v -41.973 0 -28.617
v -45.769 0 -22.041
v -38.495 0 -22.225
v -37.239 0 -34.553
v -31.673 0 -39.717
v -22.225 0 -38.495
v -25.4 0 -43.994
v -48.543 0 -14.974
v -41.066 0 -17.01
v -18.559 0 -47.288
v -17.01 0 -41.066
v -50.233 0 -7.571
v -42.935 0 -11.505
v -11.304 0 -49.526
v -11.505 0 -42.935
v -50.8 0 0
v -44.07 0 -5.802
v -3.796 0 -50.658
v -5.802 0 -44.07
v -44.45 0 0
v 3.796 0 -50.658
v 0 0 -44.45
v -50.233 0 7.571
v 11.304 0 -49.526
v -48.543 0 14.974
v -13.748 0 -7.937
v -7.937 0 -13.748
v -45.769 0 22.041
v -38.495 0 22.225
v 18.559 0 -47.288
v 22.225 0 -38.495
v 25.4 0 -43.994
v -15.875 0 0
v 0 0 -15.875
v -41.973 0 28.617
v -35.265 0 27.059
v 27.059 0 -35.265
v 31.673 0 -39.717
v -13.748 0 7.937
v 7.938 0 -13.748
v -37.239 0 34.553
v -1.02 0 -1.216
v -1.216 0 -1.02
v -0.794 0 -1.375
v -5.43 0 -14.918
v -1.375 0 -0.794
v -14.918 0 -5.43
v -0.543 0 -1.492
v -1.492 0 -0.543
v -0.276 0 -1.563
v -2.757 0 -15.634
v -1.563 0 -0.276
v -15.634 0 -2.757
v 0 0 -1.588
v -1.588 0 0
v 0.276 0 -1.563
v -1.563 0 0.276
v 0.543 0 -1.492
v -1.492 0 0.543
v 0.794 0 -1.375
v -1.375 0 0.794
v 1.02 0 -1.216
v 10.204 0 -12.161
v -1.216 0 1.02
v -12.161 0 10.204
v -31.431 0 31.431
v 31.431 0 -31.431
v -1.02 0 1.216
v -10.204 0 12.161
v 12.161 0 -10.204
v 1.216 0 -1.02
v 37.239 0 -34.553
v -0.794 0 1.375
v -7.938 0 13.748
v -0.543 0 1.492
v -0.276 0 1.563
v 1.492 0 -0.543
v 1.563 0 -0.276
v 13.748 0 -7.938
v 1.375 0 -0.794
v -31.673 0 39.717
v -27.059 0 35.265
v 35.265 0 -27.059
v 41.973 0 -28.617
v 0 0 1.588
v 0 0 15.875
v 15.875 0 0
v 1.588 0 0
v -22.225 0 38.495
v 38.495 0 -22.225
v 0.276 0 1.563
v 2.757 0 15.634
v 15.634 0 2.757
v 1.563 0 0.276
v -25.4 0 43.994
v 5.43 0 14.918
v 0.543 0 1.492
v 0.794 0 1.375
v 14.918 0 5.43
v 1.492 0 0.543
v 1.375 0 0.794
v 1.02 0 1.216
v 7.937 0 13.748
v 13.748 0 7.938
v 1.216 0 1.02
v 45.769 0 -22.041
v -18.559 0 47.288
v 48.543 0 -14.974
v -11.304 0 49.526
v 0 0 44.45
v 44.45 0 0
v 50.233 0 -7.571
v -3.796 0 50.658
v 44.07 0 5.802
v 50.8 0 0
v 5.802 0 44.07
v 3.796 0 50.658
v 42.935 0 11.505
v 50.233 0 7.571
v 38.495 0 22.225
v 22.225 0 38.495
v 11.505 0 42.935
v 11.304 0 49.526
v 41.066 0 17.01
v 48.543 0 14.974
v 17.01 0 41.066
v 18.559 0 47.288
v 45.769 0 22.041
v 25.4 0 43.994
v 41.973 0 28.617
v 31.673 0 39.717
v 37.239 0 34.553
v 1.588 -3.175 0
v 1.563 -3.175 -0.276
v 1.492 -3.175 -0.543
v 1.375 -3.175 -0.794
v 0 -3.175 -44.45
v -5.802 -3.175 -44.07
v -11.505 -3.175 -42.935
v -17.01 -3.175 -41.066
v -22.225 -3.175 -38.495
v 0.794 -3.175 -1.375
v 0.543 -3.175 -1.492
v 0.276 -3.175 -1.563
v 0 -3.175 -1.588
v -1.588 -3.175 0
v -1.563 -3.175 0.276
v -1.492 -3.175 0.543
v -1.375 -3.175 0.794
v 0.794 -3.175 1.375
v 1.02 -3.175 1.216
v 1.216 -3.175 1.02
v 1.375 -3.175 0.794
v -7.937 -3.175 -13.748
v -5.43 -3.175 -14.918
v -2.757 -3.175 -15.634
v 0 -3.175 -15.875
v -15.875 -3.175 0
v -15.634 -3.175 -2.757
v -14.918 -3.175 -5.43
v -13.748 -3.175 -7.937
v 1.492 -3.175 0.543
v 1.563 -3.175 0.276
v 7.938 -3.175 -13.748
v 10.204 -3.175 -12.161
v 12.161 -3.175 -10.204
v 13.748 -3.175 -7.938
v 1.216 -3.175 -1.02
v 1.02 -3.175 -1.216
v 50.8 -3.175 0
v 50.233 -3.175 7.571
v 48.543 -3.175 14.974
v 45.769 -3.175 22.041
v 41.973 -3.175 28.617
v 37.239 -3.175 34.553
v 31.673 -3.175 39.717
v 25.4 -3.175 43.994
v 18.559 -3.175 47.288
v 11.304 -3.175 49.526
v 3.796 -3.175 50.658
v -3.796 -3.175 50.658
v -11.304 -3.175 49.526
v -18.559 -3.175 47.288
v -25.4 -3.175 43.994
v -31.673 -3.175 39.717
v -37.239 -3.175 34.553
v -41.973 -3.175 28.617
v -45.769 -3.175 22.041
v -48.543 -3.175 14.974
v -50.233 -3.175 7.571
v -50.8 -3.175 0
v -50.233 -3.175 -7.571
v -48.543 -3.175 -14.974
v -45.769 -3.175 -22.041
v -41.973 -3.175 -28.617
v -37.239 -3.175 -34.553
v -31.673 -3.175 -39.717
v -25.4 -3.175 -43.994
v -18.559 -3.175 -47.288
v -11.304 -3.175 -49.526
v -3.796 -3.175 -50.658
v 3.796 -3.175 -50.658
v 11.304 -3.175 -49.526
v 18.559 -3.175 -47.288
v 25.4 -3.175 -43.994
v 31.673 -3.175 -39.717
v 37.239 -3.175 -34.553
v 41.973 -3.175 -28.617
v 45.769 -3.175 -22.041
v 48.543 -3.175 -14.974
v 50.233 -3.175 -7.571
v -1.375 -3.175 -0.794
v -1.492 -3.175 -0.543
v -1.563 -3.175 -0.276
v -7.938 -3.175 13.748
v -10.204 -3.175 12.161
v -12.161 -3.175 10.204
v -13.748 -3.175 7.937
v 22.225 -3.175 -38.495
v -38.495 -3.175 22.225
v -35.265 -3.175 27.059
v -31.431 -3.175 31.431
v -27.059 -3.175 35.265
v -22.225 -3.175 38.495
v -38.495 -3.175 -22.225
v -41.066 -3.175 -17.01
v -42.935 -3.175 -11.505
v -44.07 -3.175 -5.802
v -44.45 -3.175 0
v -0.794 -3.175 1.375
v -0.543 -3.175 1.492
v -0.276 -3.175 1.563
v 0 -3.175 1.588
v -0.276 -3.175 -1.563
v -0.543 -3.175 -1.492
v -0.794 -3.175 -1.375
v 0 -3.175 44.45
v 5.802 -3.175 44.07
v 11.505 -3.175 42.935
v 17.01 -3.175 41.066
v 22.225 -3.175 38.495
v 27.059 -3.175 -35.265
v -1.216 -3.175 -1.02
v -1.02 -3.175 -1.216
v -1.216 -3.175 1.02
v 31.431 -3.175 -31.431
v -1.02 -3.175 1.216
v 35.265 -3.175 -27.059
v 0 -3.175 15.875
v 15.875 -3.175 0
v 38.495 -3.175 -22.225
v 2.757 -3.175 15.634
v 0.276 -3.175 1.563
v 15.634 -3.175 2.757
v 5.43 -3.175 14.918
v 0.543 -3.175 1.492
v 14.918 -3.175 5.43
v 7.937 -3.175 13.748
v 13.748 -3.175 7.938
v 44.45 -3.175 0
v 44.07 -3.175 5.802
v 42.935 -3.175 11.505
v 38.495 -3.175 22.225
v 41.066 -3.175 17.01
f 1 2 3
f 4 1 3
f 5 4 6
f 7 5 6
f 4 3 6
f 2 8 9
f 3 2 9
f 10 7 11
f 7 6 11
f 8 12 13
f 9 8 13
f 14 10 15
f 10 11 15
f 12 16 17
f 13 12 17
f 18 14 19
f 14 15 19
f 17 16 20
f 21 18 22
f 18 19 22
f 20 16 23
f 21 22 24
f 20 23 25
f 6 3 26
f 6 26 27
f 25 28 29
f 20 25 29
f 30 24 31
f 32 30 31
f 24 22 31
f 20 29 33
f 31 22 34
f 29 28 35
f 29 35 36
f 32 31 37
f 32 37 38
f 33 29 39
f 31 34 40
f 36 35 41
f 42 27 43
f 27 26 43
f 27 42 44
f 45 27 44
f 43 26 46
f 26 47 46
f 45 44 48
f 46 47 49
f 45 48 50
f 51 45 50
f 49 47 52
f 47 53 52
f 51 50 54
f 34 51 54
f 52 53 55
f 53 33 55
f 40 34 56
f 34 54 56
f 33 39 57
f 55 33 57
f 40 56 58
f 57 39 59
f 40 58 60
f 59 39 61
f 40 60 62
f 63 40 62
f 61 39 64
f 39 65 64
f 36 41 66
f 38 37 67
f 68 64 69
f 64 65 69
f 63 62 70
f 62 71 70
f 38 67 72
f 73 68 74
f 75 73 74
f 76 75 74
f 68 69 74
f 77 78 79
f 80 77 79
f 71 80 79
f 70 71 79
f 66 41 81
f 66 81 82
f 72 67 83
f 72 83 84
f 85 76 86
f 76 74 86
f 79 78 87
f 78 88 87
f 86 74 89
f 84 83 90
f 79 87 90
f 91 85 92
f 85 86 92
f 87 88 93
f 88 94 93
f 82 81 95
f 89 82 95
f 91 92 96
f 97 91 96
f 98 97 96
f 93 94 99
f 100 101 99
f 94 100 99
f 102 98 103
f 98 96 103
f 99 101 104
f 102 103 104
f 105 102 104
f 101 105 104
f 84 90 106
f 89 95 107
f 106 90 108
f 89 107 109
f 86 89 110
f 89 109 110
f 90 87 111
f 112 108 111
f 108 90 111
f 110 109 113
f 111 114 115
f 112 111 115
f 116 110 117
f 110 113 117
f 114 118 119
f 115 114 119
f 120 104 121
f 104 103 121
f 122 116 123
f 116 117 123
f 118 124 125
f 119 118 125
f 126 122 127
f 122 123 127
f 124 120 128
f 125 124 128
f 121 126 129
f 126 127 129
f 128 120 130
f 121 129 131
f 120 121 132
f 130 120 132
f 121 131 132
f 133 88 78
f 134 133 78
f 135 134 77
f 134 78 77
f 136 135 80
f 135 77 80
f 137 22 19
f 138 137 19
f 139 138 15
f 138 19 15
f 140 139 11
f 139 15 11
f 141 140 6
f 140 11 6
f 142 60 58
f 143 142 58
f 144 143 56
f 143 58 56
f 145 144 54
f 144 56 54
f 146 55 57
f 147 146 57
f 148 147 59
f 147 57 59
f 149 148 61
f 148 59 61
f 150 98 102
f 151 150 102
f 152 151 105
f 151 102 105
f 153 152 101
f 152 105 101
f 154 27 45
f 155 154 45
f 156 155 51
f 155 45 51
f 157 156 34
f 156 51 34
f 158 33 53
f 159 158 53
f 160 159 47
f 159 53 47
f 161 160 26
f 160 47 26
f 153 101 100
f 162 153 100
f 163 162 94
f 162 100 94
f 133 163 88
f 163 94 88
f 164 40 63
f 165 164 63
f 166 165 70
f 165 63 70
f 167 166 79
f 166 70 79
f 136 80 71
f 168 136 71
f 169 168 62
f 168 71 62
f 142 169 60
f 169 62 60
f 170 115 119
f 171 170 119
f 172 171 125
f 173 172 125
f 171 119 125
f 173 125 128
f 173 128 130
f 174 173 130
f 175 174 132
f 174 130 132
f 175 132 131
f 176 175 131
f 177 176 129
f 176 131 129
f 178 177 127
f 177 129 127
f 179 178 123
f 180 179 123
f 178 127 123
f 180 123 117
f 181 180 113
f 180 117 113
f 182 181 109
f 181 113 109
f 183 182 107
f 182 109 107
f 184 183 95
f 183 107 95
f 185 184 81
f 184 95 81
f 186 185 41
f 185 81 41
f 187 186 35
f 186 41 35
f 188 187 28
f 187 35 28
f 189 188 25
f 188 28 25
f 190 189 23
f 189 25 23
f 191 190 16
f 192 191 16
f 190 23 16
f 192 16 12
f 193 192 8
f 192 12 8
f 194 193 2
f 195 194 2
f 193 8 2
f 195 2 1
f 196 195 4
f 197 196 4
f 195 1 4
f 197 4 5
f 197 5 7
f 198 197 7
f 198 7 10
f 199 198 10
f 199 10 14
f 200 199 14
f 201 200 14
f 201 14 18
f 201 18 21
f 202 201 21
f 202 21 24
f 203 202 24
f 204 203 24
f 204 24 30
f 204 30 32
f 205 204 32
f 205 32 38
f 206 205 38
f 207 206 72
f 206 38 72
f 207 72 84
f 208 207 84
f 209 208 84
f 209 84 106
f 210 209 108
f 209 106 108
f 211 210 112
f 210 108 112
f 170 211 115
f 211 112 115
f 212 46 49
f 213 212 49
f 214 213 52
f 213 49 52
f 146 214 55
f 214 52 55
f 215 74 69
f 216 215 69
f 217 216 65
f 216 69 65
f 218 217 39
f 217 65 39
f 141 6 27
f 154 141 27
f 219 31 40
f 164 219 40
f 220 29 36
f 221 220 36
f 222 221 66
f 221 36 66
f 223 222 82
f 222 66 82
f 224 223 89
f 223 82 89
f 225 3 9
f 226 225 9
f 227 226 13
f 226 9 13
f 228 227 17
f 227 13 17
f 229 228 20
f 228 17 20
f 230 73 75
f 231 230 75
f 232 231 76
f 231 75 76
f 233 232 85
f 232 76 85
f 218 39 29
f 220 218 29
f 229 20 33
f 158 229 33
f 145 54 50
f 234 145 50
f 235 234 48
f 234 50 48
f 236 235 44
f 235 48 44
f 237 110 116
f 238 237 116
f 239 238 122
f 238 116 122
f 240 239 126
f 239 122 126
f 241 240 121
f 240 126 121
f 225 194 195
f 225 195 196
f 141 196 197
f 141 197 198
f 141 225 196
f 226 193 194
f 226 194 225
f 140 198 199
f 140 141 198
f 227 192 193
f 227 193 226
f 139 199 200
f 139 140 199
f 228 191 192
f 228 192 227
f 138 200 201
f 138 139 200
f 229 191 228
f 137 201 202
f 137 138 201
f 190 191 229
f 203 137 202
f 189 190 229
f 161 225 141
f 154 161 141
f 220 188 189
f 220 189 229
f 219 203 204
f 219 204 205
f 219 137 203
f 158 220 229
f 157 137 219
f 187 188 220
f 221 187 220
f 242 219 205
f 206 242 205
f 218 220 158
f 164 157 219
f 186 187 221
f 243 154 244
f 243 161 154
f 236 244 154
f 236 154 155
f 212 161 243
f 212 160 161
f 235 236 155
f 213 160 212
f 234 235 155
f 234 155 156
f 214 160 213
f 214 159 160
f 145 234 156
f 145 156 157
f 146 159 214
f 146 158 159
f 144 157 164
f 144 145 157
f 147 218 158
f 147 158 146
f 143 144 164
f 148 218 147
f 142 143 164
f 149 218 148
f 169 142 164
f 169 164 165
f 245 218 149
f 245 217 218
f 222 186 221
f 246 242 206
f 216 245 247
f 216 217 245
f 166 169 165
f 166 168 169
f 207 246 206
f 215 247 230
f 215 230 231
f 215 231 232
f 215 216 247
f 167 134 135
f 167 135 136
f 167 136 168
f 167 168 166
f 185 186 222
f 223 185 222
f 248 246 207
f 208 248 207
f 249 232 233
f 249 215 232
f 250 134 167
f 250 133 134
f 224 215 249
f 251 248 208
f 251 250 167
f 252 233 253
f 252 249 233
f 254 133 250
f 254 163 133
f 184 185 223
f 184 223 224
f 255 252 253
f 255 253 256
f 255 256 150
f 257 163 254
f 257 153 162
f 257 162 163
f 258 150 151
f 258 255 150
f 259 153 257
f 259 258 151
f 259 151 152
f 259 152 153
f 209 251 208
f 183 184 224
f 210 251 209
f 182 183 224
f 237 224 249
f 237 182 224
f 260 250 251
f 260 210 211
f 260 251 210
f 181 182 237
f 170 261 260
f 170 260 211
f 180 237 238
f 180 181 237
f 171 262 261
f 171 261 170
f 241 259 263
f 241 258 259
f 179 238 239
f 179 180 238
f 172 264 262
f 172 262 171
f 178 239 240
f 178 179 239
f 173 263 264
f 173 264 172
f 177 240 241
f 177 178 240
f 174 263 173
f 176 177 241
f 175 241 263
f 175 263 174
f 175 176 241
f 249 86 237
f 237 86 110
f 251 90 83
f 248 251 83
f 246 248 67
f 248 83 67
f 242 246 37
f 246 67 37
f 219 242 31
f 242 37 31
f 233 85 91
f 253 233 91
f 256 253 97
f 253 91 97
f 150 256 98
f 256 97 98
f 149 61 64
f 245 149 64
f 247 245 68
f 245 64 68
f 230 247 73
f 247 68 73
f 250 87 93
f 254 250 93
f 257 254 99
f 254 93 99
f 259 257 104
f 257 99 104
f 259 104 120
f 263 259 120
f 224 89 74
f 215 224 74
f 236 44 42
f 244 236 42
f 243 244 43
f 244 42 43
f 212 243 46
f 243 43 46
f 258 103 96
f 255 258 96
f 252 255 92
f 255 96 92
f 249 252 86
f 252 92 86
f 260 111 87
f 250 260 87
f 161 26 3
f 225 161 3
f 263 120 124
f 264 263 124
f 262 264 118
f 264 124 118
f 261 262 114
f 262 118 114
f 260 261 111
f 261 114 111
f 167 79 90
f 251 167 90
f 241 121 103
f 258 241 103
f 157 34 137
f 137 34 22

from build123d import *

# Parameters (mm, degrees)
F0_R     = 50.8
F1_DEPTH = 3.175


with BuildPart() as f1:
    # F0 (on Front) → F1 (new body)
    with BuildSketch(Plane.XZ):
        Circle(F0_R)
        with BuildLine():
            ThreePointArc((-38.494829, 22.225), (-31.430896, 31.430896), (-22.225, 38.494829))
            Line((-22.225, 38.494829), (-7.9375, 13.748153))
            ThreePointArc((-7.9375, 13.748153), (-4.108752, 15.334072), (0, 15.875))
            Line((0, 15.875), (0, 44.45))
            ThreePointArc((0, 44.45), (11.504507, 42.935403), (22.225, 38.494829))
            Line((22.225, 38.494829), (7.9375, 13.748153))
            ThreePointArc((7.9375, 13.748153), (11.22532, 11.22532), (13.748153, 7.9375))
            Line((13.748153, 7.9375), (38.494829, 22.225))
            ThreePointArc((38.494829, 22.225), (42.935403, 11.504507), (44.45, 0))
            Line((44.45, 0), (15.875, 0))
            ThreePointArc((15.875, 0), (15.334072, -4.108752), (13.748153, -7.9375))
            Line((13.748153, -7.9375), (38.494829, -22.225))
            ThreePointArc((38.494829, -22.225), (31.430896, -31.430896), (22.225, -38.494829))
            Line((22.225, -38.494829), (7.9375, -13.748153))
            ThreePointArc((7.9375, -13.748153), (4.108752, -15.334072), (0, -15.875))
            Line((0, -15.875), (0, -44.45))
            ThreePointArc((0, -44.45), (-11.504507, -42.935403), (-22.225, -38.494829))
            Line((-22.225, -38.494829), (-7.9375, -13.748153))
            ThreePointArc((-7.9375, -13.748153), (-11.22532, -11.22532), (-13.748153, -7.9375))
            Line((-13.748153, -7.9375), (-38.494829, -22.225))
            ThreePointArc((-38.494829, -22.225), (-42.935403, -11.504507), (-44.45, 0))
            Line((-44.45, 0), (-15.875, 0))
            ThreePointArc((-15.875, 0), (-15.334072, 4.108752), (-13.748153, 7.9375))
            Line((-13.748153, 7.9375), (-38.494829, 22.225))
        make_face(mode=Mode.SUBTRACT)
        with BuildLine():
            ThreePointArc((0, 15.875), (-4.108752, 15.334072), (-7.9375, 13.748153))
            ThreePointArc((-7.9375, 13.748153), (-11.22532, 11.22532), (-13.748153, 7.9375))
            ThreePointArc((-13.748153, 7.9375), (-15.334072, 4.108752), (-15.875, 0))
            ThreePointArc((-15.875, 0), (-15.334072, -4.108752), (-13.748153, -7.9375))
            ThreePointArc((-13.748153, -7.9375), (-11.22532, -11.22532), (-7.9375, -13.748153))
            ThreePointArc((-7.9375, -13.748153), (-4.108752, -15.334072), (0, -15.875))
            ThreePointArc((0, -15.875), (4.108752, -15.334072), (7.9375, -13.748153))
            ThreePointArc((7.9375, -13.748153), (11.22532, -11.22532), (13.748153, -7.9375))
            ThreePointArc((13.748153, -7.9375), (15.334072, -4.108752), (15.875, 0))
            ThreePointArc((15.875, 0), (15.334072, 4.108752), (13.748153, 7.9375))
            ThreePointArc((13.748153, 7.9375), (11.22532, 11.22532), (7.9375, 13.748153))
            ThreePointArc((7.9375, 13.748153), (4.108752, 15.334072), (0, 15.875))
        make_face()
        with BuildLine():
            ThreePointArc((1.374815, 0.79375), (1.533407, 0.410875), (1.5875, 0))
            ThreePointArc((1.5875, 0), (1.533407, -0.410875), (1.374815, -0.79375))
            ThreePointArc((1.374815, -0.79375), (1.122532, -1.122532), (0.79375, -1.374815))
            ThreePointArc((0.79375, -1.374815), (0.410875, -1.533407), (0, -1.5875))
            ThreePointArc((0, -1.5875), (-0.410875, -1.533407), (-0.79375, -1.374815))
            ThreePointArc((-0.79375, -1.374815), (-1.122532, -1.122532), (-1.374815, -0.79375))
            ThreePointArc((-1.374815, -0.79375), (-1.533407, -0.410875), (-1.5875, 0))
            ThreePointArc((-1.5875, 0), (-1.533407, 0.410875), (-1.374815, 0.79375))
            ThreePointArc((-1.374815, 0.79375), (-1.122532, 1.122532), (-0.79375, 1.374815))
            ThreePointArc((-0.79375, 1.374815), (-0.410875, 1.533407), (0, 1.5875))
            ThreePointArc((0, 1.5875), (0.410875, 1.533407), (0.79375, 1.374815))
            ThreePointArc((0.79375, 1.374815), (1.122532, 1.122532), (1.374815, 0.79375))
        make_face(mode=Mode.SUBTRACT)
    extrude(amount=F1_DEPTH)


solid = f1.part
